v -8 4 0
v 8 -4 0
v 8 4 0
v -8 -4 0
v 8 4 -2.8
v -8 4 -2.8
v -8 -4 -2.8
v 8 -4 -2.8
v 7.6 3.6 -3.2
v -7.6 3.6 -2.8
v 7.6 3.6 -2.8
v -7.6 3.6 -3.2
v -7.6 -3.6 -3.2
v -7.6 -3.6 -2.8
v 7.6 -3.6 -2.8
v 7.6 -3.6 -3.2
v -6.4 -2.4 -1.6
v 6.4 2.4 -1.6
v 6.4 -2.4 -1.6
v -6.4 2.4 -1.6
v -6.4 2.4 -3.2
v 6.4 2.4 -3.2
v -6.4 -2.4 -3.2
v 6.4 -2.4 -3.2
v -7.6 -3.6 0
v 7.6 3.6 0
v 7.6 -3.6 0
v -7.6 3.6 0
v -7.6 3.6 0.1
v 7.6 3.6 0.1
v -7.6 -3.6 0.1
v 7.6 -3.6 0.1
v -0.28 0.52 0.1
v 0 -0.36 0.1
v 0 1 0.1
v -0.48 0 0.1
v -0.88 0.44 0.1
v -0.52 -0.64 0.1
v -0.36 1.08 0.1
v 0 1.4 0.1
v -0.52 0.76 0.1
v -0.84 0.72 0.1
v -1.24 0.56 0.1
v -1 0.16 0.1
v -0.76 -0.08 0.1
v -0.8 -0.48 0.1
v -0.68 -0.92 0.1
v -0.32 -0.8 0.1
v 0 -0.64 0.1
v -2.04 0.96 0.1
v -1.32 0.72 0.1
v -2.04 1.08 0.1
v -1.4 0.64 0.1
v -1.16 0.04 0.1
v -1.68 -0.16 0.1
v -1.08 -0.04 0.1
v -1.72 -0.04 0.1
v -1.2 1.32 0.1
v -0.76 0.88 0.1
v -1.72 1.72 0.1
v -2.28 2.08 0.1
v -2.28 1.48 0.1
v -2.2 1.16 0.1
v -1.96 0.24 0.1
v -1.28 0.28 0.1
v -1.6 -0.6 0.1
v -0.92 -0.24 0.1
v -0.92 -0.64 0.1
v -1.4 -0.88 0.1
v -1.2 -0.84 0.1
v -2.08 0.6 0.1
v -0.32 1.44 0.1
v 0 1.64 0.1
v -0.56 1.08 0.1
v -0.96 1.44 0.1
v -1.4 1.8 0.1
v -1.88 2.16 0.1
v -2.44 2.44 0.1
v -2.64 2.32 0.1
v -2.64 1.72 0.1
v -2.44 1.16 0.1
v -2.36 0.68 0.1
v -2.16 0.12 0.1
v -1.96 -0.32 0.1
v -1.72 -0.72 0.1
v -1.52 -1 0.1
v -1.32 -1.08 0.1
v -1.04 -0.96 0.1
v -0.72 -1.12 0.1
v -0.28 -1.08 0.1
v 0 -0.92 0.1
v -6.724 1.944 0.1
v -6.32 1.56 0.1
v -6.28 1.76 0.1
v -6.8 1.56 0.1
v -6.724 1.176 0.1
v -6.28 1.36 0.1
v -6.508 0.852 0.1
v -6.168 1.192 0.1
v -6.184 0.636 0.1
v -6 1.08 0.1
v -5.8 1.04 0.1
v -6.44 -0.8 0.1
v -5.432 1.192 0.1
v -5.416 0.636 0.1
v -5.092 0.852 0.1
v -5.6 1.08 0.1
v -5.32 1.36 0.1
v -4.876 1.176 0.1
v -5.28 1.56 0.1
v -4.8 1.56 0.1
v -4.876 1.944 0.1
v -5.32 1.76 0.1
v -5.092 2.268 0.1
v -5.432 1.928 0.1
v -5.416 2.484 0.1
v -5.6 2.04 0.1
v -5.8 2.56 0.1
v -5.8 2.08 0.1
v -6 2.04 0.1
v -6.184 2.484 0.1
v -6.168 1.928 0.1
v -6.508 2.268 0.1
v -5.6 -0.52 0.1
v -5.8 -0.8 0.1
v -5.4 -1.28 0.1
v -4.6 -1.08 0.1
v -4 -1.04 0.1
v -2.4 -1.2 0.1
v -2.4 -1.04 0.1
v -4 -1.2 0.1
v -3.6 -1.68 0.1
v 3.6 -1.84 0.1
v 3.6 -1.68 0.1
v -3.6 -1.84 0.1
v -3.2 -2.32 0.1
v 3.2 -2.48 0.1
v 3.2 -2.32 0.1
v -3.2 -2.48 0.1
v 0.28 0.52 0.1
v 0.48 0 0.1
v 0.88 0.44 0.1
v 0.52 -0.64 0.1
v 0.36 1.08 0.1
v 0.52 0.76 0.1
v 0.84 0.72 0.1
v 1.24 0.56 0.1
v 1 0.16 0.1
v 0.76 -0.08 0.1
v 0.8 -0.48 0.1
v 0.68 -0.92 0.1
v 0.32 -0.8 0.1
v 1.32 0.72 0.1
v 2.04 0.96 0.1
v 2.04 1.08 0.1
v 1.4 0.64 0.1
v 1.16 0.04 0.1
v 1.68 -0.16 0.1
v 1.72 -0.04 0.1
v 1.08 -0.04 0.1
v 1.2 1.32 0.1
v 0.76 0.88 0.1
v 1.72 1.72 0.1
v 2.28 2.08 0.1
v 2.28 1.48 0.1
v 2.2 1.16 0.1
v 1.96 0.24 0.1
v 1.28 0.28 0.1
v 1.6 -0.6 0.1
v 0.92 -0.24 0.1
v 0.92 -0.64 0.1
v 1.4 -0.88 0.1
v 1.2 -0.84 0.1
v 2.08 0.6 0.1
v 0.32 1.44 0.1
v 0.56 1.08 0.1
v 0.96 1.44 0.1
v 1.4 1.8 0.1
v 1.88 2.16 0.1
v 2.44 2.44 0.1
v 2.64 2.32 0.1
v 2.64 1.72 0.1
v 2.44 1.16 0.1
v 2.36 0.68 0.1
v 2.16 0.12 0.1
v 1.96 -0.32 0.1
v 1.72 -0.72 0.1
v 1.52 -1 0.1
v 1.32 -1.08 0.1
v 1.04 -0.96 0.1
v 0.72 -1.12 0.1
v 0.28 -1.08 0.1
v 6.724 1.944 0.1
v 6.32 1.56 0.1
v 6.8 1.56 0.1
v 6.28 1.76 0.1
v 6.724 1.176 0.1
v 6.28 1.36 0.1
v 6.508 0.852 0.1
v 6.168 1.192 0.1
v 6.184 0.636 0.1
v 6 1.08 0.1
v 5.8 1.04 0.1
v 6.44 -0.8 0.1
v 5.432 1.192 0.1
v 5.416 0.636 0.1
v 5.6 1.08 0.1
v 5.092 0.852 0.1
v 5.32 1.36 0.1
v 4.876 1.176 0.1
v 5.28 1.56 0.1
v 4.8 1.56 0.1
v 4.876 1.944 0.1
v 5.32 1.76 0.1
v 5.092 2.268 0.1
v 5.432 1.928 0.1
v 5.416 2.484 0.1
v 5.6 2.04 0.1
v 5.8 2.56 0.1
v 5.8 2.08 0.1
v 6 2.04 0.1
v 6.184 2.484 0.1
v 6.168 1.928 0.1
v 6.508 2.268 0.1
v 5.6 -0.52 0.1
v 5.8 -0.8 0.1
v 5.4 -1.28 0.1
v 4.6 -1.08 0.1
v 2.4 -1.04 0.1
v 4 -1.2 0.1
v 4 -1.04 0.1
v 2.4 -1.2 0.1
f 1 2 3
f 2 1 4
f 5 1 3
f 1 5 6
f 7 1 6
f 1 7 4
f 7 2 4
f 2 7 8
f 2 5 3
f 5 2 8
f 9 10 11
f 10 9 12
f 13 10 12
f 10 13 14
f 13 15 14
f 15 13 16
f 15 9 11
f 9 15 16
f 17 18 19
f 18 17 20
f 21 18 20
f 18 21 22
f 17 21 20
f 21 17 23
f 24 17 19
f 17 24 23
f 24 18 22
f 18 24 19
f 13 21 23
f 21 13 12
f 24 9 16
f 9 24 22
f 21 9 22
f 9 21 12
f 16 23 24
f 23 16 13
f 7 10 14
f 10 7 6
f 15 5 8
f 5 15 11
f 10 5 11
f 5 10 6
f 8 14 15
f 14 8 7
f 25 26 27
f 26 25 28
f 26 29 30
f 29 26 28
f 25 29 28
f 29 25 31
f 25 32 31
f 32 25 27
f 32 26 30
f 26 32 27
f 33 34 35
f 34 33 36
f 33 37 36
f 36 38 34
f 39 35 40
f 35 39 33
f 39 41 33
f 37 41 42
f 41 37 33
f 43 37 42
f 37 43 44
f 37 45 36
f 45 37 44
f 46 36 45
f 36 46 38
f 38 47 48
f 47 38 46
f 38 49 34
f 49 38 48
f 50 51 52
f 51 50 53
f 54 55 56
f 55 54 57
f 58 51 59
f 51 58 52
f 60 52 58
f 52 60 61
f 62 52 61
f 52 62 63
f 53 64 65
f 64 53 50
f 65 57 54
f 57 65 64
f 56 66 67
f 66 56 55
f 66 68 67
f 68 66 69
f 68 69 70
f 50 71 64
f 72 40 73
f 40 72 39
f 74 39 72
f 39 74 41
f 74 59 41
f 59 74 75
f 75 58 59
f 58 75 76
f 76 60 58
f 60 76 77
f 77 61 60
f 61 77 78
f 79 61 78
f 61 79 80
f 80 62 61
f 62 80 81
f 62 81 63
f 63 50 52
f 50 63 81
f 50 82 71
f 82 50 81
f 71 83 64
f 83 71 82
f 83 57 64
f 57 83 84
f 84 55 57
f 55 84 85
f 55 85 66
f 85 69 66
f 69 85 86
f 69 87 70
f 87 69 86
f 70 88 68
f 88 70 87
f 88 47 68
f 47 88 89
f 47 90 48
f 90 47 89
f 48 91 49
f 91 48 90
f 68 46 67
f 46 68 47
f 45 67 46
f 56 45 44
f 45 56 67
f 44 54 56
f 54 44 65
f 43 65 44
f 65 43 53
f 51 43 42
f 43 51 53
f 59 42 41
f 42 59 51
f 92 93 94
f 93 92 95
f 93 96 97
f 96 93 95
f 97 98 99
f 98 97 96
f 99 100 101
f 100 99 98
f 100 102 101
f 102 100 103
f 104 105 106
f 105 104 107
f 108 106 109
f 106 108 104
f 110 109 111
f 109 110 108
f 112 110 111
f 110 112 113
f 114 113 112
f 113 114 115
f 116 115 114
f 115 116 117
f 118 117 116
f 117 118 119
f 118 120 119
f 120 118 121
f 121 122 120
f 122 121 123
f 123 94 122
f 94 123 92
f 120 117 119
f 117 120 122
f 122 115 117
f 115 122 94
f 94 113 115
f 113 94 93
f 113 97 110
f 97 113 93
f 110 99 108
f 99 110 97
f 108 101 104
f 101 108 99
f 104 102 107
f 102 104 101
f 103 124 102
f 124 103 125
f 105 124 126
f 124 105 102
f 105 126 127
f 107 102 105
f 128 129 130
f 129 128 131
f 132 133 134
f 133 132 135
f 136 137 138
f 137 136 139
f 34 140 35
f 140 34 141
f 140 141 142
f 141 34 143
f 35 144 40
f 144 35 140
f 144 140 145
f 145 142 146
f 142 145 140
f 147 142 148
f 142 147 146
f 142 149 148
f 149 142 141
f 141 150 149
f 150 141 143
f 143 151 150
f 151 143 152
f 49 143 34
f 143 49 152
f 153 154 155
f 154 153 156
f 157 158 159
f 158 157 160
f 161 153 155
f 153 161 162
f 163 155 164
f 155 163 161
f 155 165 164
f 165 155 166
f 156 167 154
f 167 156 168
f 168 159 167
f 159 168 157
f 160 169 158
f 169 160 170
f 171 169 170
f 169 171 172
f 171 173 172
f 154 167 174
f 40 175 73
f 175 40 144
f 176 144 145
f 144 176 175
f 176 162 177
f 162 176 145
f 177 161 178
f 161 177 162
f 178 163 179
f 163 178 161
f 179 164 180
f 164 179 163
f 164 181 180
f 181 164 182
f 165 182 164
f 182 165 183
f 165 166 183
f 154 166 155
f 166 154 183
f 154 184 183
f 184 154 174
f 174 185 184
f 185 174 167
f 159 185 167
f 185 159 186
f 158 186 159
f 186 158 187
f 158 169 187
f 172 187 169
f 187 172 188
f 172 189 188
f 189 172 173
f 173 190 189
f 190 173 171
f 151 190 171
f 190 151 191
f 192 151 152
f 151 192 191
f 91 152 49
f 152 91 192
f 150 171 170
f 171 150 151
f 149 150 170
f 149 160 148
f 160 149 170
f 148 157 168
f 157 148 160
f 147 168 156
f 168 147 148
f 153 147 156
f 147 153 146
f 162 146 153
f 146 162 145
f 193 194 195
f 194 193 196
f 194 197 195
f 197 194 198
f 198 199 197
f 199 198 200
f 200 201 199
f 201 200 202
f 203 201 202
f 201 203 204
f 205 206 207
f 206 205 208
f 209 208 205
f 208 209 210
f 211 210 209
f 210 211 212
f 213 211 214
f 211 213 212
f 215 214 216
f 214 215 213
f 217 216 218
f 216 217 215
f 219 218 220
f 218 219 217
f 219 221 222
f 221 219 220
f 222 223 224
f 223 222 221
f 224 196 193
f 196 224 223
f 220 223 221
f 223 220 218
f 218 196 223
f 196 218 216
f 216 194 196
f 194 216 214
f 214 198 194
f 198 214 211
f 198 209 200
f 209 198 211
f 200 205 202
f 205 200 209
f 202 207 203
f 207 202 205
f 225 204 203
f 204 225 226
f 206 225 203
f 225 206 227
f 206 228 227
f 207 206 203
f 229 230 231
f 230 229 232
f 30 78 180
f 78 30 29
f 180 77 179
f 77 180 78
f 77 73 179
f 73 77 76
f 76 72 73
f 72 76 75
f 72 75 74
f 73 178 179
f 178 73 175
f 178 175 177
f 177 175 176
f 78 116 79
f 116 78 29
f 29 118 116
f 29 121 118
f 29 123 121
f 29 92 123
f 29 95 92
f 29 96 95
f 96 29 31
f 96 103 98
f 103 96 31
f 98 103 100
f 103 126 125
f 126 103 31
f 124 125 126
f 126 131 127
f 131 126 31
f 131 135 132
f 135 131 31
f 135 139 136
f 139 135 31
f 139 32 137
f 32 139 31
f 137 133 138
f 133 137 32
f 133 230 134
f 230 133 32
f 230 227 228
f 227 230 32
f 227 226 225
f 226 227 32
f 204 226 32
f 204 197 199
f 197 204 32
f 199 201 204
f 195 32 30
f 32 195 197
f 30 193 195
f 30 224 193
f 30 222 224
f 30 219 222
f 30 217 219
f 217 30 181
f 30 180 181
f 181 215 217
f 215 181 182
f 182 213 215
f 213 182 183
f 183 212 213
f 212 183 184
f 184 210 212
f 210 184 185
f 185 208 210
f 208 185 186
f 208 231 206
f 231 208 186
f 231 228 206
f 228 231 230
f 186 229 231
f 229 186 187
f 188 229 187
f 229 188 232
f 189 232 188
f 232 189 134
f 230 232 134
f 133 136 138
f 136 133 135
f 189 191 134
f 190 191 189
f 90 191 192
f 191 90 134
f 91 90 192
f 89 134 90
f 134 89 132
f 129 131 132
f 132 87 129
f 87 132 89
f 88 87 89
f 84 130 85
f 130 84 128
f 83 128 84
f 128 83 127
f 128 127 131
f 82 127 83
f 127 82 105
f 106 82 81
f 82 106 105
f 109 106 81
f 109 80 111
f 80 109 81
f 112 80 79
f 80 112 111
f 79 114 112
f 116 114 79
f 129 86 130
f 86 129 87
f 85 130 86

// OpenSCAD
// file: ../p/box5.scad
use <../lib.scad>
function ldraw_lib__box5() = [
// 0 Box with 5 Faces and All Edges
// 0 Name: box5.dat
// 0 Author: James Jessiman
// 0 !LDRAW_ORG Primitive UPDATE 2012-01
// 0 !LICENSE Licensed under CC BY 4.0 : see CAreadme.txt
// 
// 0 BFC CERTIFY CCW
  [0,"BFC","CERTIFY"],
  [0,"BFC","CCW"],
// 
// 0 !HISTORY 2002-04-03 [sbliss] Modified for BFC compliance
// 0 !HISTORY 2002-04-25 [PTadmin] Official Update 2002-02
// 0 !HISTORY 2007-06-24 [PTadmin] Header formatted for Contributor Agreement
// 0 !HISTORY 2008-07-01 [PTadmin] Official Update 2008-01
// 0 !HISTORY 2012-02-16 [Philo] Changed to CCW
// 0 !HISTORY 2012-03-30 [PTadmin] Official Update 2012-01
// 
// 
// 2 24 1 1 1 -1 1 1
  [2,24,1,1,1,-1,1,1],
// 2 24 -1 1 1 -1 1 -1
  [2,24,-1,1,1,-1,1,-1],
// 2 24 -1 1 -1 1 1 -1
  [2,24,-1,1,-1,1,1,-1],
// 2 24 1 1 -1 1 1 1
  [2,24,1,1,-1,1,1,1],
// 2 24 1 0 1 -1 0 1
  [2,24,1,0,1,-1,0,1],
// 2 24 -1 0 1 -1 0 -1
  [2,24,-1,0,1,-1,0,-1],
// 2 24 -1 0 -1 1 0 -1
  [2,24,-1,0,-1,1,0,-1],
// 2 24 1 0 -1 1 0 1
  [2,24,1,0,-1,1,0,1],
// 2 24 1 0 1 1 1 1
  [2,24,1,0,1,1,1,1],
// 2 24 -1 0 1 -1 1 1
  [2,24,-1,0,1,-1,1,1],
// 2 24 1 0 -1 1 1 -1
  [2,24,1,0,-1,1,1,-1],
// 2 24 -1 0 -1 -1 1 -1
  [2,24,-1,0,-1,-1,1,-1],
// 4 16 -1 1 1 1 1 1 1 1 -1 -1 1 -1
  [4,16,-1,1,1,1,1,1,1,1,-1,-1,1,-1],
// 4 16 -1 1 1 -1 0 1 1 0 1 1 1 1
  [4,16,-1,1,1,-1,0,1,1,0,1,1,1,1],
// 4 16 -1 1 -1 -1 0 -1 -1 0 1 -1 1 1
  [4,16,-1,1,-1,-1,0,-1,-1,0,1,-1,1,1],
// 4 16 1 1 -1 1 0 -1 -1 0 -1 -1 1 -1
  [4,16,1,1,-1,1,0,-1,-1,0,-1,-1,1,-1],
// 4 16 1 1 1 1 0 1 1 0 -1 1 1 -1
  [4,16,1,1,1,1,0,1,1,0,-1,1,1,-1],
];
module ldraw_lib__box5(step=0, col=false, unit=2/5, alt=false, line=0.2, solid=!$preview)
    makepoly(ldraw_lib__box5(), step=step, col=col, unit=unit, alt=alt, line=line, solid=solid);
ldraw_lib__box5(line=0.2);
// file: ../p/box4.scad
use <../lib.scad>
function ldraw_lib__box4() = [
// 0 Box with 4 Faces (2 Parallel Pairs) and All Edges
// 0 Name: box4.dat
// 0 Author: James Jessiman
// 0 !LDRAW_ORG Primitive UPDATE 2012-01
// 0 !LICENSE Licensed under CC BY 4.0 : see CAreadme.txt
// 
// 0 BFC CERTIFY CCW
  [0,"BFC","CERTIFY"],
  [0,"BFC","CCW"],
// 
// 0 !HISTORY 2002-04-03 [sbliss] Modified for BFC compliance
// 0 !HISTORY 2002-04-25 [PTadmin] Official Update 2002-02
// 0 !HISTORY 2007-06-24 [PTadmin] Header formatted for Contributor Agreement
// 0 !HISTORY 2008-07-01 [PTadmin] Official Update 2008-01
// 0 !HISTORY 2012-02-16 [Philo] Changed to CCW
// 0 !HISTORY 2012-03-30 [PTadmin] Official Update 2012-01
// 
// 
// 2 24 1 1 1 -1 1 1
  [2,24,1,1,1,-1,1,1],
// 2 24 -1 1 1 -1 1 -1
  [2,24,-1,1,1,-1,1,-1],
// 2 24 -1 1 -1 1 1 -1
  [2,24,-1,1,-1,1,1,-1],
// 2 24 1 1 -1 1 1 1
  [2,24,1,1,-1,1,1,1],
// 2 24 1 0 1 -1 0 1
  [2,24,1,0,1,-1,0,1],
// 2 24 -1 0 1 -1 0 -1
  [2,24,-1,0,1,-1,0,-1],
// 2 24 -1 0 -1 1 0 -1
  [2,24,-1,0,-1,1,0,-1],
// 2 24 1 0 -1 1 0 1
  [2,24,1,0,-1,1,0,1],
// 2 24 1 0 1 1 1 1
  [2,24,1,0,1,1,1,1],
// 2 24 -1 0 1 -1 1 1
  [2,24,-1,0,1,-1,1,1],
// 2 24 1 0 -1 1 1 -1
  [2,24,1,0,-1,1,1,-1],
// 2 24 -1 0 -1 -1 1 -1
  [2,24,-1,0,-1,-1,1,-1],
// 4 16 -1 1 1 -1 0 1 1 0 1 1 1 1
  [4,16,-1,1,1,-1,0,1,1,0,1,1,1,1],
// 4 16 -1 1 -1 -1 0 -1 -1 0 1 -1 1 1
  [4,16,-1,1,-1,-1,0,-1,-1,0,1,-1,1,1],
// 4 16 1 1 -1 1 0 -1 -1 0 -1 -1 1 -1
  [4,16,1,1,-1,1,0,-1,-1,0,-1,-1,1,-1],
// 4 16 1 1 1 1 0 1 1 0 -1 1 1 -1
  [4,16,1,1,1,1,0,1,1,0,-1,1,1,-1],
];
module ldraw_lib__box4(step=0, col=false, unit=2/5, alt=false, line=0.2, solid=!$preview)
    makepoly(ldraw_lib__box4(), step=step, col=col, unit=unit, alt=alt, line=line, solid=solid);
ldraw_lib__box4(line=0.2);
// file: ../p/box5-12.scad
use <../lib.scad>
function ldraw_lib__box5_12() = [
// 0 Box with 5 Faces without Any Edges
// 0 Name: box5-12.dat
// 0 Author: Chris Dee [cwdee]
// 0 !LDRAW_ORG Primitive UPDATE 2009-02
// 0 !LICENSE Licensed under CC BY 4.0 : see CAreadme.txt
// 
// 0 BFC CERTIFY CCW
  [0,"BFC","CERTIFY"],
  [0,"BFC","CCW"],
// 
// 0 !HISTORY 2009-09-03 [PTadmin] Official Update 2009-02
// 
// 
// 4 16 1 1 1 1 1 -1 -1 1 -1 -1 1 1
  [4,16,1,1,1,1,1,-1,-1,1,-1,-1,1,1],
// 4 16 -1 0 1 1 0 1 1 1 1 -1 1 1
  [4,16,-1,0,1,1,0,1,1,1,1,-1,1,1],
// 4 16 -1 0 -1 -1 0 1 -1 1 1 -1 1 -1
  [4,16,-1,0,-1,-1,0,1,-1,1,1,-1,1,-1],
// 4 16 1 0 -1 -1 0 -1 -1 1 -1 1 1 -1
  [4,16,1,0,-1,-1,0,-1,-1,1,-1,1,1,-1],
// 4 16 1 0 1 1 0 -1 1 1 -1 1 1 1
  [4,16,1,0,1,1,0,-1,1,1,-1,1,1,1],
// 0
];
module ldraw_lib__box5_12(step=0, col=false, unit=2/5, alt=false, line=0.2, solid=!$preview)
    makepoly(ldraw_lib__box5_12(), step=step, col=col, unit=unit, alt=alt, line=line, solid=solid);
ldraw_lib__box5_12(line=0.2);
// file: s/3069bs01.scad
use <../../lib.scad>
use <../../p/box4.scad>
use <../../p/box5.scad>
function ldraw_lib__s__3069bs01() = [
// 0 ~Tile  1 x  2 with Groove without Top Face
// 0 Name: s\3069bs01.dat
// 0 Author: Santeri Piippo [arezey]
// 0 !LDRAW_ORG Subpart UPDATE 2010-02
// 0 !LICENSE Licensed under CC BY 4.0 : see CAreadme.txt
// 
// 0 BFC CERTIFY CCW
  [0,"BFC","CERTIFY"],
  [0,"BFC","CCW"],
// 
// 0 !HISTORY 2010-07-05 [PTadmin] Official Update 2010-02
// 
// 
// 1 16 0 0 0 20 0 0 0 7 0 0 0 10 box4.dat
  [1,16,0,0,0,20,0,0,0,7,0,0,0,10, ldraw_lib__box4()],
// 1 16 0 7 0 19 0 0 0 1 0 0 0 9 box4.dat
  [1,16,0,7,0,19,0,0,0,1,0,0,0,9, ldraw_lib__box4()],
// 0 BFC INVERTNEXT
  [0,"BFC","INVERTNEXT"],
// 1 16 0 8 0 16 0 0 0 -4 0 0 0 6 box5.dat
  [1,16,0,8,0,16,0,0,0,-4,0,0,0,6, ldraw_lib__box5()],
// 4 16 -19 8 9 -16 8 6 -16 8 -6 -19 8 -9
  [4,16,-19,8,9,-16,8,6,-16,8,-6,-19,8,-9],
// 4 16 19 8 -9 16 8 -6 16 8 6 19 8 9
  [4,16,19,8,-9,16,8,-6,16,8,6,19,8,9],
// 4 16 19 8 9 16 8 6 -16 8 6 -19 8 9
  [4,16,19,8,9,16,8,6,-16,8,6,-19,8,9],
// 4 16 -19 8 -9 -16 8 -6 16 8 -6 19 8 -9
  [4,16,-19,8,-9,-16,8,-6,16,8,-6,19,8,-9],
// 4 16 -20 7 10 -19 7 9 -19 7 -9 -20 7 -10
  [4,16,-20,7,10,-19,7,9,-19,7,-9,-20,7,-10],
// 4 16 20 7 -10 19 7 -9 19 7 9 20 7 10
  [4,16,20,7,-10,19,7,-9,19,7,9,20,7,10],
// 4 16 20 7 10 19 7 9 -19 7 9 -20 7 10
  [4,16,20,7,10,19,7,9,-19,7,9,-20,7,10],
// 4 16 -20 7 -10 -19 7 -9 19 7 -9 20 7 -10
  [4,16,-20,7,-10,-19,7,-9,19,7,-9,20,7,-10],
// 0 //
];
module ldraw_lib__s__3069bs01(step=0, col=false, unit=2/5, alt=false, line=0.2, solid=!$preview)
    makepoly(ldraw_lib__s__3069bs01(), step=step, col=col, unit=unit, alt=alt, line=line, solid=solid);
ldraw_lib__s__3069bs01(line=0.2);
// file: 3069b.scad
use <../lib.scad>
use <s/3069bs01.scad>
function ldraw_lib__3069b() = [
// 0 Tile  1 x  2 with Groove
// 0 Name: 3069b.dat
// 0 Author: Santeri Piippo [arezey]
// 0 !LDRAW_ORG Part UPDATE 2010-02
// 0 !LICENSE Licensed under CC BY 4.0 : see CAreadme.txt
// 
// 0 BFC CERTIFY CCW
  [0,"BFC","CERTIFY"],
  [0,"BFC","CCW"],
// 
// 0 !HISTORY 2010-07-05 [PTadmin] Official Update 2010-02
// 
// 
// 4 16 20 0 -10 20 0 10 -20 0 10 -20 0 -10
  [4,16,20,0,-10,20,0,10,-20,0,10,-20,0,-10],
// 1 16 0 0 0 1 0 0 0 1 0 0 0 1 s\3069bs01.dat
  [1,16,0,0,0,1,0,0,0,1,0,0,0,1, ldraw_lib__s__3069bs01()],
// 0 //
];
module ldraw_lib__3069b(step=0, col=false, unit=2/5, alt=false, line=0.2, solid=!$preview)
    makepoly(ldraw_lib__3069b(), step=step, col=col, unit=unit, alt=alt, line=line, solid=solid);
ldraw_lib__3069b(line=0.2);
// main file
use <../lib.scad>
use <3069b.scad>
use <4650853h.scad>
function ldraw_lib__3069bdf0() = [
// 0 Tile  1 x  2 with Magenta Star on Butterfly Wings and 2 Yellow Award Ribbons Sticker
// 0 Name: 3069bdf0.dat
// 0 Author: Takeshi Takahashi [RainbowDolphin]
// 0 !LDRAW_ORG Shortcut UPDATE 2024-08
// 0 !LICENSE Licensed under CC BY 4.0 : see CAreadme.txt
// 
// 0 BFC CERTIFY CCW
  [0,"BFC","CERTIFY"],
  [0,"BFC","CCW"],
// 
// 0 !CATEGORY Sticker Shortcut
// 0 !KEYWORDS Bricklink 3069pb0274, Flying Club, Friends, Pilot license, Set 3063
// 
// 0 !HISTORY 2024-09-30 [OrionP] Official Update 2024-08
// 
// 1 16 0 0 0 1 0 0 0 1 0 0 0 1 3069b.dat
  [1,16,0,0,0,1,0,0,0,1,0,0,0,1, ldraw_lib__3069b()],
// 1 16 0 0 0 1 0 0 0 1 0 0 0 1 4650853h.dat
  [1,16,0,0,0,1,0,0,0,1,0,0,0,1, ldraw_lib__4650853h()],
];
module ldraw_lib__3069bdf0(step=0, col=false, unit=2/5, alt=false, line=0.2, solid=!$preview)
    makepoly(ldraw_lib__3069bdf0(), step=step, col=col, unit=unit, alt=alt, line=line, solid=solid);
ldraw_lib__3069bdf0(line=0.2);
